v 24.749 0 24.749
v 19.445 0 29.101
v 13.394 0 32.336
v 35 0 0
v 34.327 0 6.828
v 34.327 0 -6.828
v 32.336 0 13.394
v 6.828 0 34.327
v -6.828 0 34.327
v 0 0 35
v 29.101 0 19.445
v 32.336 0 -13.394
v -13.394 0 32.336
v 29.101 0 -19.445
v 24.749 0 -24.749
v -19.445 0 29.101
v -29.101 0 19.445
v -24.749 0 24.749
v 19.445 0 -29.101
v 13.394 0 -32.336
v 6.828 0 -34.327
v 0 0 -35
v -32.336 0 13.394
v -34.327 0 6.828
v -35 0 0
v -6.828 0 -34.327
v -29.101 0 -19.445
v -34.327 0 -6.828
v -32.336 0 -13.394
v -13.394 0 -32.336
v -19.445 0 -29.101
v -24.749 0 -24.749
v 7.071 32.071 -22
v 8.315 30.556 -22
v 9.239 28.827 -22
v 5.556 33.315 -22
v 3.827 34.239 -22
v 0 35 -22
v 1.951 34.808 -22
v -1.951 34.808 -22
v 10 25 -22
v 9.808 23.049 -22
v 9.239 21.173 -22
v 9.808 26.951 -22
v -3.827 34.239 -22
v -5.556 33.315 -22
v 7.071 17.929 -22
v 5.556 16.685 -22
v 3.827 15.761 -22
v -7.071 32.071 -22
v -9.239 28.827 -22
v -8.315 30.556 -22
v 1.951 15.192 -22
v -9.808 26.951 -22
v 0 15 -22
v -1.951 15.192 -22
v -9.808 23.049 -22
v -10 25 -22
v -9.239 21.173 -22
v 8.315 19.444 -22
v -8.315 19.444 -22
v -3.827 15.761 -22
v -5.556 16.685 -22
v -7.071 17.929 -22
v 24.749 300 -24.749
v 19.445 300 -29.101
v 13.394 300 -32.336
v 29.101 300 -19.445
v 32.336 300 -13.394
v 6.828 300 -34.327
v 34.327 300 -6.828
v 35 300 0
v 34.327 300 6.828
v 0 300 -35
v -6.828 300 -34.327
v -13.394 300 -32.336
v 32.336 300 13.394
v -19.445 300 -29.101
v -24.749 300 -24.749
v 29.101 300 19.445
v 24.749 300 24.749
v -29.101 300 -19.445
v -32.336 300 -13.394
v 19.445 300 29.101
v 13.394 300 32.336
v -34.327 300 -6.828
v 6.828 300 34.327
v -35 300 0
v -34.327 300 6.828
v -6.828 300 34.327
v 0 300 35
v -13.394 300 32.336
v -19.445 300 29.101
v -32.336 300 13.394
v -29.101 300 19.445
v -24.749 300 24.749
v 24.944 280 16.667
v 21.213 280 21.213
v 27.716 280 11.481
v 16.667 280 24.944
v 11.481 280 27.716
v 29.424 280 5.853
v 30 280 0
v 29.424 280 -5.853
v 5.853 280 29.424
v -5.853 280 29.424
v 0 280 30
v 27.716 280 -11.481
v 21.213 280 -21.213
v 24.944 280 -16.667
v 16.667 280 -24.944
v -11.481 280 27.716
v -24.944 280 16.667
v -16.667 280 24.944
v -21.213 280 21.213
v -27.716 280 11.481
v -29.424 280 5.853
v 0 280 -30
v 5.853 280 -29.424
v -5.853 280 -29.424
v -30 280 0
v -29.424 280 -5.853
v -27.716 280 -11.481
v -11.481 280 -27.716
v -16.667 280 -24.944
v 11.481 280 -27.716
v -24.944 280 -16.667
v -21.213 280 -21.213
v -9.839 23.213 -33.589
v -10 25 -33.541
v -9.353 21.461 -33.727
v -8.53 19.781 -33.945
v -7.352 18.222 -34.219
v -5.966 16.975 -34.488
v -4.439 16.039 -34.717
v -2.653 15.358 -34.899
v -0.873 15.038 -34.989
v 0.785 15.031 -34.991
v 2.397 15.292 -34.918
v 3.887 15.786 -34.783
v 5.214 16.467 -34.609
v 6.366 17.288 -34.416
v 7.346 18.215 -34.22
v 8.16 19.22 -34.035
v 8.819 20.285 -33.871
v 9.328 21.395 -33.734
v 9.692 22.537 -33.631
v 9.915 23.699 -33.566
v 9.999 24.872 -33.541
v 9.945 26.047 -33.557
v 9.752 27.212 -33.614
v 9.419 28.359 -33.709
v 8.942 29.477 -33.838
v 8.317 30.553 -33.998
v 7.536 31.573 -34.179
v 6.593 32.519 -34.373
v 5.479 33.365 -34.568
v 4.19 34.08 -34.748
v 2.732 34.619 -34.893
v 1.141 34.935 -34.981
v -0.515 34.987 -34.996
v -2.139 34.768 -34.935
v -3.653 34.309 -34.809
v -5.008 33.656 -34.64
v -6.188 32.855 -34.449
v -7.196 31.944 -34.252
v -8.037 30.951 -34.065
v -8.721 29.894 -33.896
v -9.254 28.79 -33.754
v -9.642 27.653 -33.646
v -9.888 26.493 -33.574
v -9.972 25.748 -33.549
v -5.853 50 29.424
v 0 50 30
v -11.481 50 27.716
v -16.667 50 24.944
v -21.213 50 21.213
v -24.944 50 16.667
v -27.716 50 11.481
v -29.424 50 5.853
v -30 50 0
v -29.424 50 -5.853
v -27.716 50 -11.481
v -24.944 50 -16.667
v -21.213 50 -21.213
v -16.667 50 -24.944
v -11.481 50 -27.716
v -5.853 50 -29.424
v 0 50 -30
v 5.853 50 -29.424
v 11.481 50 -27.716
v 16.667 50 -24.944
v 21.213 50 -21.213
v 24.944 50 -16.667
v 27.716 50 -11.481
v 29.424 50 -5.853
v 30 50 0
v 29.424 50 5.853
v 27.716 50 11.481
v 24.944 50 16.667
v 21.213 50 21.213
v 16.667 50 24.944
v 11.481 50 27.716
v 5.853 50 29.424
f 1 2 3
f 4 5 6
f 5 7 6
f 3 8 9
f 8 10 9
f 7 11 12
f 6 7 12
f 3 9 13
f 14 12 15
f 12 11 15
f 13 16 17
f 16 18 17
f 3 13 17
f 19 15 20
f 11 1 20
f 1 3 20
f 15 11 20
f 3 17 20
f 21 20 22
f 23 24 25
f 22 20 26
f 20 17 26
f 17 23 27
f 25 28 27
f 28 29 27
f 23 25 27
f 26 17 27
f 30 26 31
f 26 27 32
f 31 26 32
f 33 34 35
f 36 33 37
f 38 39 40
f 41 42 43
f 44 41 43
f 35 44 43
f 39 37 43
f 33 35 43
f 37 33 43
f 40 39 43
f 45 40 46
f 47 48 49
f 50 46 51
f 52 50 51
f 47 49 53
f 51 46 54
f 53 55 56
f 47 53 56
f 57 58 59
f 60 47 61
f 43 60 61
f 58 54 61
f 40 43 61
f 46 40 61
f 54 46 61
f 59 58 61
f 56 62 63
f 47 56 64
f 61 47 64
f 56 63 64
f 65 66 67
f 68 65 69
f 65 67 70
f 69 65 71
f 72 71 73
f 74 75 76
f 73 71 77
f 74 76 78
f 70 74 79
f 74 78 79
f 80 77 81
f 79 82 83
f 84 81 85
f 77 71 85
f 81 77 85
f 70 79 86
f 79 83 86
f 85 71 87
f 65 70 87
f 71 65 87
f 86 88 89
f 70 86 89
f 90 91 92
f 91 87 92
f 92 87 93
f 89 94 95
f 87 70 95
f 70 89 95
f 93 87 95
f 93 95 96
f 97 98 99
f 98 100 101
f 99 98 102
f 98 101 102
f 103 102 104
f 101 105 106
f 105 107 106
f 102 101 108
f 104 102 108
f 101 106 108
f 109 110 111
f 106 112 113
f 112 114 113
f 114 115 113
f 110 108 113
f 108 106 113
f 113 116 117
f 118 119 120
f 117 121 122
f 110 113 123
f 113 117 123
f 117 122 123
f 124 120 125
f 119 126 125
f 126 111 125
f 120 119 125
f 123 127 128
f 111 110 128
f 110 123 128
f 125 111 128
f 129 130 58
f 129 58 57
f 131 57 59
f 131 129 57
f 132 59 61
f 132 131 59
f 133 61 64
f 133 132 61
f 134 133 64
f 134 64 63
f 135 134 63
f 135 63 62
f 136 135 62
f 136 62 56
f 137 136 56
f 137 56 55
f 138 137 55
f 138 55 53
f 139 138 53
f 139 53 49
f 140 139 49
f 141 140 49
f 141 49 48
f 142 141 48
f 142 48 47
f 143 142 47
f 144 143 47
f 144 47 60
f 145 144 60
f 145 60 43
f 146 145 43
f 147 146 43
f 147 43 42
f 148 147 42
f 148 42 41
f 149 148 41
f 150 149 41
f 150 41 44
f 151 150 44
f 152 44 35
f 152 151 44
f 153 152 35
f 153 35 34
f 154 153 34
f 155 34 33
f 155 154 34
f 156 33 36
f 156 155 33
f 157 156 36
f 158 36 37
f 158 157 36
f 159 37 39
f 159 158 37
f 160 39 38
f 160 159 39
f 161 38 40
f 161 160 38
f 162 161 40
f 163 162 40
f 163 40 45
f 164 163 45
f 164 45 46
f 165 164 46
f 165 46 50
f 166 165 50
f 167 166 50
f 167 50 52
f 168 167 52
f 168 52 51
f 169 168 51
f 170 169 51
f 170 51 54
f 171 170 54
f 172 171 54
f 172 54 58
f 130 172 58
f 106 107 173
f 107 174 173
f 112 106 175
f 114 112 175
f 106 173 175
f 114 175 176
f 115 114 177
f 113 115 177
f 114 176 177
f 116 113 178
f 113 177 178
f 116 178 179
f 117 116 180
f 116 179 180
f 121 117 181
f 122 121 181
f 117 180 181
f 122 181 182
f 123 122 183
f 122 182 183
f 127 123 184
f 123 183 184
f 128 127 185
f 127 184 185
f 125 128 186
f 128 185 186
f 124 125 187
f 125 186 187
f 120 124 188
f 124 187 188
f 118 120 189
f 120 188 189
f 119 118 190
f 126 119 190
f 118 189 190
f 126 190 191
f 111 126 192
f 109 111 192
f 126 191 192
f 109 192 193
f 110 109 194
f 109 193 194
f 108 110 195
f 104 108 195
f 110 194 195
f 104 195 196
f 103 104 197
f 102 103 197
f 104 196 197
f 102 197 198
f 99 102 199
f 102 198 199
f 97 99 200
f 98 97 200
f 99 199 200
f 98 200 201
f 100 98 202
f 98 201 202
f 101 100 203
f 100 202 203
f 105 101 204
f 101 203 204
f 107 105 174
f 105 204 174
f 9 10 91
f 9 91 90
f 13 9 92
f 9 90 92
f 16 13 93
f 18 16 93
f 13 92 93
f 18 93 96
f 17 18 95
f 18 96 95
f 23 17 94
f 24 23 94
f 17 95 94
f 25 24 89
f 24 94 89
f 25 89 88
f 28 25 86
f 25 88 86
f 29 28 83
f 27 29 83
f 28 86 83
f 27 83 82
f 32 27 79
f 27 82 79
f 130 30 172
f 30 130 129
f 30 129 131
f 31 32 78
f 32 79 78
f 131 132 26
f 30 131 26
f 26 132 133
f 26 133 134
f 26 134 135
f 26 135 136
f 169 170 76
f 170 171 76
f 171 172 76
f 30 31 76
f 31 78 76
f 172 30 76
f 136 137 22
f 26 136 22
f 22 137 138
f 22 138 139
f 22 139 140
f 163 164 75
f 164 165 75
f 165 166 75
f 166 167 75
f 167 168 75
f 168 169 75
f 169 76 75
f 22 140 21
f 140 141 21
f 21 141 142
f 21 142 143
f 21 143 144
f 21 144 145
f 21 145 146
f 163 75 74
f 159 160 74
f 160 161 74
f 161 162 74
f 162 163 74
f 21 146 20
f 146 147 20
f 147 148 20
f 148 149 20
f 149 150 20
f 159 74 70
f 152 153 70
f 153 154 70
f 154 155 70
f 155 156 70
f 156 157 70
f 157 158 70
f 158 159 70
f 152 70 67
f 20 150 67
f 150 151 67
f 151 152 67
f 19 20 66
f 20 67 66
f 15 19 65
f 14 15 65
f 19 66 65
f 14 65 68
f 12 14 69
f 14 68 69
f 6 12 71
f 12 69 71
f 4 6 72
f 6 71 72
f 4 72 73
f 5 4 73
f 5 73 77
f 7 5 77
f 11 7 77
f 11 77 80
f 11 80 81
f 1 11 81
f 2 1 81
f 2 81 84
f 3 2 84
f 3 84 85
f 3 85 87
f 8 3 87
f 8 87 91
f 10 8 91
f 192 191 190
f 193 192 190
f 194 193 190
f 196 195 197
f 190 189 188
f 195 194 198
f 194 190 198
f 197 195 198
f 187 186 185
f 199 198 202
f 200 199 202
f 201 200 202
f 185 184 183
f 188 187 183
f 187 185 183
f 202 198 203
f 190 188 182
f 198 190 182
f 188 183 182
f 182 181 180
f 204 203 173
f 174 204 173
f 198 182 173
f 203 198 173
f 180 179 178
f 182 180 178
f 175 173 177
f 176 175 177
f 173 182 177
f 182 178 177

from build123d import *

# Parameters (mm, degrees)
CUT_EXTRUDE_1_DEPTH      = 10
CUT_EXTRUDE_1_DEPTH_BACK = 10
SKETCH_2_R               = 10


with BuildPart() as part:
    # Эскиз1 → Повернуть1 (revolve)
    with BuildSketch(Plane.XY):
        Polygon((-30, 50), (0, 50), (0, 0), (-35, 0), (-35, 300), (0, 300), (0, 280), (-30, 280), align=None)
    revolve(axis=Axis((0, 50, 0), (0, -1, 0)))

    # Эскиз2 → Вырез-Вытянуть1 (cut, two sides: drawn at the far end of the back side and taken through both)
    with BuildSketch(Plane.XY.offset(-32).offset(-CUT_EXTRUDE_1_DEPTH_BACK)):
        with Locations((0, 25)):
            Circle(SKETCH_2_R)
    extrude(amount=CUT_EXTRUDE_1_DEPTH + CUT_EXTRUDE_1_DEPTH_BACK, mode=Mode.SUBTRACT)


solid = part.part
